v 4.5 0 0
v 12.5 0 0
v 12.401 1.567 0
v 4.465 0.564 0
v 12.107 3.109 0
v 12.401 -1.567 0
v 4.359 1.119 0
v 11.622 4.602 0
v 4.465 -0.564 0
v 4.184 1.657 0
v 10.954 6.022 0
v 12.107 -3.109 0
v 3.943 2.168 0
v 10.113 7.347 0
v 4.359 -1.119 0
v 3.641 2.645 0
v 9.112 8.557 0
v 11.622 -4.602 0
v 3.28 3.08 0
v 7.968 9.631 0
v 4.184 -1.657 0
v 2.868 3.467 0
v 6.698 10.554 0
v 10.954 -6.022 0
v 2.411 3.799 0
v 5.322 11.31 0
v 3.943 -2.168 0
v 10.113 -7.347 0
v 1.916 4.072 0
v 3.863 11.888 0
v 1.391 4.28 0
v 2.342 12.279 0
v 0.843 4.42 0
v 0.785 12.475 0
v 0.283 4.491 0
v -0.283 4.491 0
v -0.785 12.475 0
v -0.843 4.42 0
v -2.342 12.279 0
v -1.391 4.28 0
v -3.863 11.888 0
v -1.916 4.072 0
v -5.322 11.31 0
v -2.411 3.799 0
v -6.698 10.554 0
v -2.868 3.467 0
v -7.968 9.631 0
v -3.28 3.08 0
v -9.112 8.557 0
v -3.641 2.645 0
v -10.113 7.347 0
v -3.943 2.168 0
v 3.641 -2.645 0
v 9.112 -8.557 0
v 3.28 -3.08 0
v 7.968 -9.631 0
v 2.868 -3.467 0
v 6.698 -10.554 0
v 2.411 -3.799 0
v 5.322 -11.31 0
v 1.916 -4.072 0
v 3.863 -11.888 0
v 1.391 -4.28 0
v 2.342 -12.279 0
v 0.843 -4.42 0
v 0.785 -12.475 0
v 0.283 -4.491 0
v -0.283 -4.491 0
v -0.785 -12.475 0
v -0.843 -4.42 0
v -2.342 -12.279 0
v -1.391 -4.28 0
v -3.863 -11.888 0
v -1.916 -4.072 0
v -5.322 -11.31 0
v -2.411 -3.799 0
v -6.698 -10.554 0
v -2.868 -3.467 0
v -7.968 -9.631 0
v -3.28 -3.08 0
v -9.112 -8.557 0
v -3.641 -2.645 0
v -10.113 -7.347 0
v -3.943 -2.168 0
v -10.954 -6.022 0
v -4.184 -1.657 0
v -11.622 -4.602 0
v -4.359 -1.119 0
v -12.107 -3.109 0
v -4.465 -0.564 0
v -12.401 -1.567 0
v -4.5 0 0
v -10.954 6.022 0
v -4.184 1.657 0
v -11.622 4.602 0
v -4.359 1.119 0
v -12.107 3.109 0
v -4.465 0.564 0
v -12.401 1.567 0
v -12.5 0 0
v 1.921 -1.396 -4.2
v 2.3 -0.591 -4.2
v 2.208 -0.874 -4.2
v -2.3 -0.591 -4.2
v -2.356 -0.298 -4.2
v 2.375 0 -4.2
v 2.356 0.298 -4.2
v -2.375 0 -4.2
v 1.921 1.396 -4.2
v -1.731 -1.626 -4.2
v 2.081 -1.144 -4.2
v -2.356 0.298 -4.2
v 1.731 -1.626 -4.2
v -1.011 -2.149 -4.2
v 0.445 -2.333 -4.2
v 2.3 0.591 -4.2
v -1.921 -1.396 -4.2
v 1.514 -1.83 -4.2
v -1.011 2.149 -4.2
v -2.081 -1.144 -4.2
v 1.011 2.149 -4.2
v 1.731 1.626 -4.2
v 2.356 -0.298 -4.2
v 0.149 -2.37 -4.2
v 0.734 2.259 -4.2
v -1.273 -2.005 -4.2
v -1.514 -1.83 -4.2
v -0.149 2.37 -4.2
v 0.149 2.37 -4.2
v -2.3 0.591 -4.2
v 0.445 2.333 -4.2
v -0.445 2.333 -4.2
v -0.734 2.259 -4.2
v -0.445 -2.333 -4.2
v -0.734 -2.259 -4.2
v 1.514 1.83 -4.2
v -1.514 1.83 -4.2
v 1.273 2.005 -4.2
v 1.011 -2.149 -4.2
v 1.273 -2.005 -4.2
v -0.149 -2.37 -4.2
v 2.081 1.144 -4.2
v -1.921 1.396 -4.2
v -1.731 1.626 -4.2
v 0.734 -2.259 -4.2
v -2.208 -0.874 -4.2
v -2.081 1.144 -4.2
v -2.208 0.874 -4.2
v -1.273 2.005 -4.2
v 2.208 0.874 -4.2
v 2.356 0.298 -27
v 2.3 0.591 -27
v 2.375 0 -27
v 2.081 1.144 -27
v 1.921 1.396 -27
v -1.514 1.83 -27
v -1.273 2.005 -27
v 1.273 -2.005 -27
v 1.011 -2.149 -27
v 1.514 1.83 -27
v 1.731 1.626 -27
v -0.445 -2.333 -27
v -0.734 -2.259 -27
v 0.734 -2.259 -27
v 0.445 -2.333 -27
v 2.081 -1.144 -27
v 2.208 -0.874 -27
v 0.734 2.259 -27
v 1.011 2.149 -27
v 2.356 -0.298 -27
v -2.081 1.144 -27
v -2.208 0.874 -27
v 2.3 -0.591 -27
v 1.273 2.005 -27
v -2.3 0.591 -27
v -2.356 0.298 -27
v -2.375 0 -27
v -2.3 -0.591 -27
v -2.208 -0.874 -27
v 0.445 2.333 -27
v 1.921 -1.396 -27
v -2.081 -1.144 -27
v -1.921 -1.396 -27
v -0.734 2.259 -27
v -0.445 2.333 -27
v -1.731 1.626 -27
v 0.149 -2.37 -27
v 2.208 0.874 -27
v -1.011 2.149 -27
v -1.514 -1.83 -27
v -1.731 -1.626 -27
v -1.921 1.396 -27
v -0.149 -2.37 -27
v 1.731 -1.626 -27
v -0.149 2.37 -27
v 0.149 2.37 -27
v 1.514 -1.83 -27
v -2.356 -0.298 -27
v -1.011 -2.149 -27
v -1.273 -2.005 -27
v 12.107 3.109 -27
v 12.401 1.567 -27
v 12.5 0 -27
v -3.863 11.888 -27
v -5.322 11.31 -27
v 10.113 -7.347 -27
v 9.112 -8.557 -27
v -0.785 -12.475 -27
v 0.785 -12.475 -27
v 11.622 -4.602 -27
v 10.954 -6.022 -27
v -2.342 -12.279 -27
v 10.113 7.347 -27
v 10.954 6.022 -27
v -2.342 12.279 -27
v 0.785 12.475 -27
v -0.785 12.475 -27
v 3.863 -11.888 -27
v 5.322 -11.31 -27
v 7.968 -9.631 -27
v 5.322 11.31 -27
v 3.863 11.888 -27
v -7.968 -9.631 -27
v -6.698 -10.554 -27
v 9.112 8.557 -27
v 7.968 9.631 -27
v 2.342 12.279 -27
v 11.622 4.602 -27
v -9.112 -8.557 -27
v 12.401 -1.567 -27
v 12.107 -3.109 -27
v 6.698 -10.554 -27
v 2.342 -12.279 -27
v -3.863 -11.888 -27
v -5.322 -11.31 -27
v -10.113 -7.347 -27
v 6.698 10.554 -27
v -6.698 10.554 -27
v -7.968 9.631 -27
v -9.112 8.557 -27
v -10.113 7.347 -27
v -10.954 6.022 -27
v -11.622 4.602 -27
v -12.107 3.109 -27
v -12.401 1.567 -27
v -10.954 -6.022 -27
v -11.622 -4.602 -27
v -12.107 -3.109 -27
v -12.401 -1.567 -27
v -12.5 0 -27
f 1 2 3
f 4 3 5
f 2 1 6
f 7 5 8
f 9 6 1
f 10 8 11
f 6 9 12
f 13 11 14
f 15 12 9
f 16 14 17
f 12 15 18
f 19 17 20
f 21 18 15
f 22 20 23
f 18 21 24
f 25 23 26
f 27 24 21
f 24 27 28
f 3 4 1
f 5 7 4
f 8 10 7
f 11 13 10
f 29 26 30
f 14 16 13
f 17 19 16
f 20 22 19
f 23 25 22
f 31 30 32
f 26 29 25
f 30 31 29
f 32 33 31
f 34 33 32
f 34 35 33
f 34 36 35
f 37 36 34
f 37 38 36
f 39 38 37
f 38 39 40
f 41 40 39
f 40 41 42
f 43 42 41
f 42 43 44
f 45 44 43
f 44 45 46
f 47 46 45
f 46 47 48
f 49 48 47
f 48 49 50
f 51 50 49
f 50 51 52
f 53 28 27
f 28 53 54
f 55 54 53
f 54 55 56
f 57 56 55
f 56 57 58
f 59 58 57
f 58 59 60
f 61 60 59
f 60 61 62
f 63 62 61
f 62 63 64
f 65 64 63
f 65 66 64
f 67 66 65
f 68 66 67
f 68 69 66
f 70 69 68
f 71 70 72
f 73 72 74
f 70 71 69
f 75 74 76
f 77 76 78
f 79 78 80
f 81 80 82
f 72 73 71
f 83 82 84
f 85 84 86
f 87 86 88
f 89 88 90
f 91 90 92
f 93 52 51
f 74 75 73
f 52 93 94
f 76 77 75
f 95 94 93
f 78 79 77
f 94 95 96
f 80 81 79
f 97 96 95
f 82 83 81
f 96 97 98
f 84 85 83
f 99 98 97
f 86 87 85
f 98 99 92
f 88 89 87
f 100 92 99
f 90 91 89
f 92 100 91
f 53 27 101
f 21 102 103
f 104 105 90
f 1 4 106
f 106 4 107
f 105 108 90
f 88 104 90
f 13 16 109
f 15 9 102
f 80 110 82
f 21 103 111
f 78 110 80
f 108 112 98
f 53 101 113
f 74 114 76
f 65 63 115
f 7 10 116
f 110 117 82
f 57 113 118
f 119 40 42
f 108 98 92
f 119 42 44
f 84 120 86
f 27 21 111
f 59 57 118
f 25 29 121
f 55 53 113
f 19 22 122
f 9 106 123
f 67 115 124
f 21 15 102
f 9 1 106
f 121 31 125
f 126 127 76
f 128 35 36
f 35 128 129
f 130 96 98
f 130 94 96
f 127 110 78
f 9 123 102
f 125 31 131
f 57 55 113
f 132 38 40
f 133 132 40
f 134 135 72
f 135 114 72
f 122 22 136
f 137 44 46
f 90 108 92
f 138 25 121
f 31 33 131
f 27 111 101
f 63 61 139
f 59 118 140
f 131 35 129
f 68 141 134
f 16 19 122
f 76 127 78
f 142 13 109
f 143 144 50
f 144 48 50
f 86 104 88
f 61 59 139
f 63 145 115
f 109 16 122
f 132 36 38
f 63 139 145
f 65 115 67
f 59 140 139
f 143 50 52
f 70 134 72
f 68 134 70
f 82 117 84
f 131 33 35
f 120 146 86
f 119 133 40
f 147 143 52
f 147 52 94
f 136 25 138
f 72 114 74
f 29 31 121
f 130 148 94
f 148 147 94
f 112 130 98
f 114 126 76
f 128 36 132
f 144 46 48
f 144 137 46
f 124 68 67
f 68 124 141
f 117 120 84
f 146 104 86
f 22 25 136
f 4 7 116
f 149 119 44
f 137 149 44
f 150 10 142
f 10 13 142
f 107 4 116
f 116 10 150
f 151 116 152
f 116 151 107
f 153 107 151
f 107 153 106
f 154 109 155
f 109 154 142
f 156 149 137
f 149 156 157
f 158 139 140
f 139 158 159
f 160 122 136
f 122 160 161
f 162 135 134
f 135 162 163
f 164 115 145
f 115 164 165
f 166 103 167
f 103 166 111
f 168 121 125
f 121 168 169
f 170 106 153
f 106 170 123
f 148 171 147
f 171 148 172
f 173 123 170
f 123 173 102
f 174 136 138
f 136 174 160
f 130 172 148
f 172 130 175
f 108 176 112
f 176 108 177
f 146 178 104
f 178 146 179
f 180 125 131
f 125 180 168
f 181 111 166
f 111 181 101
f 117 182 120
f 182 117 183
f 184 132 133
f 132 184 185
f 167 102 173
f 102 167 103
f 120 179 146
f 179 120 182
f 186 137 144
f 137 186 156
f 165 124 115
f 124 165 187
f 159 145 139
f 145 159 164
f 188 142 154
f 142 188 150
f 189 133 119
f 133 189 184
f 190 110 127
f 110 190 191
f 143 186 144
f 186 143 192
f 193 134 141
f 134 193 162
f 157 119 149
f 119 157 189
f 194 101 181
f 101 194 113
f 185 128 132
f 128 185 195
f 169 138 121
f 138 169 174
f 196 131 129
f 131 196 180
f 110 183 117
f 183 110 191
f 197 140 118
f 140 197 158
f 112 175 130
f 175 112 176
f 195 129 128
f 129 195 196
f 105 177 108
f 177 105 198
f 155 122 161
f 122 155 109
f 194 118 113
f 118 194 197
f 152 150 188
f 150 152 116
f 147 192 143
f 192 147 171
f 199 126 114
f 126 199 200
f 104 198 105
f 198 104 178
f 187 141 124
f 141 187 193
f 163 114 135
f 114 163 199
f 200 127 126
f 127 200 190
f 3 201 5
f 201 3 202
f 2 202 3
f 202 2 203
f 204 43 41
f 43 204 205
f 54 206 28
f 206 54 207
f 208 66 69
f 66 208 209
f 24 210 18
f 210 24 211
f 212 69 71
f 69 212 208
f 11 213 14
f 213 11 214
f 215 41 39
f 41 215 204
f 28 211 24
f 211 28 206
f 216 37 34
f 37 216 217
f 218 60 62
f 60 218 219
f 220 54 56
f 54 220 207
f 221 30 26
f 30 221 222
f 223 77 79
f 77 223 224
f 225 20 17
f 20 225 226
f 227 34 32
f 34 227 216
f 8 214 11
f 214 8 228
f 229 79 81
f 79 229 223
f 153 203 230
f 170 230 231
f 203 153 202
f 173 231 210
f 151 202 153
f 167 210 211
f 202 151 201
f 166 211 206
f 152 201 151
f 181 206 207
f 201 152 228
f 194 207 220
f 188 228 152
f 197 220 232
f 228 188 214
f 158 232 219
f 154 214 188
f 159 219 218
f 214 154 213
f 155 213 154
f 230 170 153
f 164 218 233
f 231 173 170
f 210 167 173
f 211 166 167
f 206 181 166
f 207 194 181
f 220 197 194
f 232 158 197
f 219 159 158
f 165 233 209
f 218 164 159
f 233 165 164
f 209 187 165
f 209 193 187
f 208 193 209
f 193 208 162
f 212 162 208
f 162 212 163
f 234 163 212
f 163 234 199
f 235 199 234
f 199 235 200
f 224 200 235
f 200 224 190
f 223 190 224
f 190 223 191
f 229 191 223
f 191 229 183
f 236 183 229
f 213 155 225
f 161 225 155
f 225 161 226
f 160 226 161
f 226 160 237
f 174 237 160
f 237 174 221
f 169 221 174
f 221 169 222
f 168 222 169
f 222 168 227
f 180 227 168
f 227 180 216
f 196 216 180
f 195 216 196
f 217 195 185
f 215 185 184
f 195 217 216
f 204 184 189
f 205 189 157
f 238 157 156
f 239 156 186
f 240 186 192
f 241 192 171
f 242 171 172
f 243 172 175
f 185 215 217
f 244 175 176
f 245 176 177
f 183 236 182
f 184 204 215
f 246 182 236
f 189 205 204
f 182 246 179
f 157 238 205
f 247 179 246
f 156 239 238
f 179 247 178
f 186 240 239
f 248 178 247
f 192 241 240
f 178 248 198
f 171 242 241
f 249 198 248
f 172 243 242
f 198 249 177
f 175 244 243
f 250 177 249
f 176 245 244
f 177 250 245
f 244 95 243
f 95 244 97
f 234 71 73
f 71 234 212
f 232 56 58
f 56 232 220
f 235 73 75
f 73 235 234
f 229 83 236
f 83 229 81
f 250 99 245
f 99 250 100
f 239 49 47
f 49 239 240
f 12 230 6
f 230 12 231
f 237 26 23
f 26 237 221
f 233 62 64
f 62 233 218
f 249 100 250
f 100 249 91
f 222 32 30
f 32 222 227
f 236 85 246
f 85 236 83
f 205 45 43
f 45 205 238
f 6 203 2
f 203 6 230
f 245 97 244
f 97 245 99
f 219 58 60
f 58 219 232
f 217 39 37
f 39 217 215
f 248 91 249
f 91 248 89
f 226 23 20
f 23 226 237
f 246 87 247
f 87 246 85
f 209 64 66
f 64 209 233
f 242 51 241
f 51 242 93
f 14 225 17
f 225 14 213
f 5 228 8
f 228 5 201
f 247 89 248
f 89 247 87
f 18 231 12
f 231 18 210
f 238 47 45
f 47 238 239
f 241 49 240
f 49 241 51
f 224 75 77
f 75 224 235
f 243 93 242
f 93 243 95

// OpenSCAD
$fn = 50;

difference() {
	union() {
		translate(v = [0, 0, -27.0]) {
			cylinder(h = 27, r = 12.5);
		}
	}
	union() {
		translate(v = [0, 0, 0]) {
			rotate(a = [0, 0, 0]) {
				difference() {
					union() {
						translate(v = [0, 0, -30.0]) {
							cylinder(h = 30, r = 2.25);
						}
						translate(v = [0, 0, -4.2]) {
							cylinder(h = 4.2, r1 = 2.375, r2 = 4.5);
						}
						translate(v = [0, 0, -30.0]) {
							cylinder(h = 30, r = 2.375);
						}
						translate(v = [0, 0, -30.0]) {
							cylinder(h = 30, r = 2.25);
						}
					}
					union();
				}
			}
		}
	}
}
